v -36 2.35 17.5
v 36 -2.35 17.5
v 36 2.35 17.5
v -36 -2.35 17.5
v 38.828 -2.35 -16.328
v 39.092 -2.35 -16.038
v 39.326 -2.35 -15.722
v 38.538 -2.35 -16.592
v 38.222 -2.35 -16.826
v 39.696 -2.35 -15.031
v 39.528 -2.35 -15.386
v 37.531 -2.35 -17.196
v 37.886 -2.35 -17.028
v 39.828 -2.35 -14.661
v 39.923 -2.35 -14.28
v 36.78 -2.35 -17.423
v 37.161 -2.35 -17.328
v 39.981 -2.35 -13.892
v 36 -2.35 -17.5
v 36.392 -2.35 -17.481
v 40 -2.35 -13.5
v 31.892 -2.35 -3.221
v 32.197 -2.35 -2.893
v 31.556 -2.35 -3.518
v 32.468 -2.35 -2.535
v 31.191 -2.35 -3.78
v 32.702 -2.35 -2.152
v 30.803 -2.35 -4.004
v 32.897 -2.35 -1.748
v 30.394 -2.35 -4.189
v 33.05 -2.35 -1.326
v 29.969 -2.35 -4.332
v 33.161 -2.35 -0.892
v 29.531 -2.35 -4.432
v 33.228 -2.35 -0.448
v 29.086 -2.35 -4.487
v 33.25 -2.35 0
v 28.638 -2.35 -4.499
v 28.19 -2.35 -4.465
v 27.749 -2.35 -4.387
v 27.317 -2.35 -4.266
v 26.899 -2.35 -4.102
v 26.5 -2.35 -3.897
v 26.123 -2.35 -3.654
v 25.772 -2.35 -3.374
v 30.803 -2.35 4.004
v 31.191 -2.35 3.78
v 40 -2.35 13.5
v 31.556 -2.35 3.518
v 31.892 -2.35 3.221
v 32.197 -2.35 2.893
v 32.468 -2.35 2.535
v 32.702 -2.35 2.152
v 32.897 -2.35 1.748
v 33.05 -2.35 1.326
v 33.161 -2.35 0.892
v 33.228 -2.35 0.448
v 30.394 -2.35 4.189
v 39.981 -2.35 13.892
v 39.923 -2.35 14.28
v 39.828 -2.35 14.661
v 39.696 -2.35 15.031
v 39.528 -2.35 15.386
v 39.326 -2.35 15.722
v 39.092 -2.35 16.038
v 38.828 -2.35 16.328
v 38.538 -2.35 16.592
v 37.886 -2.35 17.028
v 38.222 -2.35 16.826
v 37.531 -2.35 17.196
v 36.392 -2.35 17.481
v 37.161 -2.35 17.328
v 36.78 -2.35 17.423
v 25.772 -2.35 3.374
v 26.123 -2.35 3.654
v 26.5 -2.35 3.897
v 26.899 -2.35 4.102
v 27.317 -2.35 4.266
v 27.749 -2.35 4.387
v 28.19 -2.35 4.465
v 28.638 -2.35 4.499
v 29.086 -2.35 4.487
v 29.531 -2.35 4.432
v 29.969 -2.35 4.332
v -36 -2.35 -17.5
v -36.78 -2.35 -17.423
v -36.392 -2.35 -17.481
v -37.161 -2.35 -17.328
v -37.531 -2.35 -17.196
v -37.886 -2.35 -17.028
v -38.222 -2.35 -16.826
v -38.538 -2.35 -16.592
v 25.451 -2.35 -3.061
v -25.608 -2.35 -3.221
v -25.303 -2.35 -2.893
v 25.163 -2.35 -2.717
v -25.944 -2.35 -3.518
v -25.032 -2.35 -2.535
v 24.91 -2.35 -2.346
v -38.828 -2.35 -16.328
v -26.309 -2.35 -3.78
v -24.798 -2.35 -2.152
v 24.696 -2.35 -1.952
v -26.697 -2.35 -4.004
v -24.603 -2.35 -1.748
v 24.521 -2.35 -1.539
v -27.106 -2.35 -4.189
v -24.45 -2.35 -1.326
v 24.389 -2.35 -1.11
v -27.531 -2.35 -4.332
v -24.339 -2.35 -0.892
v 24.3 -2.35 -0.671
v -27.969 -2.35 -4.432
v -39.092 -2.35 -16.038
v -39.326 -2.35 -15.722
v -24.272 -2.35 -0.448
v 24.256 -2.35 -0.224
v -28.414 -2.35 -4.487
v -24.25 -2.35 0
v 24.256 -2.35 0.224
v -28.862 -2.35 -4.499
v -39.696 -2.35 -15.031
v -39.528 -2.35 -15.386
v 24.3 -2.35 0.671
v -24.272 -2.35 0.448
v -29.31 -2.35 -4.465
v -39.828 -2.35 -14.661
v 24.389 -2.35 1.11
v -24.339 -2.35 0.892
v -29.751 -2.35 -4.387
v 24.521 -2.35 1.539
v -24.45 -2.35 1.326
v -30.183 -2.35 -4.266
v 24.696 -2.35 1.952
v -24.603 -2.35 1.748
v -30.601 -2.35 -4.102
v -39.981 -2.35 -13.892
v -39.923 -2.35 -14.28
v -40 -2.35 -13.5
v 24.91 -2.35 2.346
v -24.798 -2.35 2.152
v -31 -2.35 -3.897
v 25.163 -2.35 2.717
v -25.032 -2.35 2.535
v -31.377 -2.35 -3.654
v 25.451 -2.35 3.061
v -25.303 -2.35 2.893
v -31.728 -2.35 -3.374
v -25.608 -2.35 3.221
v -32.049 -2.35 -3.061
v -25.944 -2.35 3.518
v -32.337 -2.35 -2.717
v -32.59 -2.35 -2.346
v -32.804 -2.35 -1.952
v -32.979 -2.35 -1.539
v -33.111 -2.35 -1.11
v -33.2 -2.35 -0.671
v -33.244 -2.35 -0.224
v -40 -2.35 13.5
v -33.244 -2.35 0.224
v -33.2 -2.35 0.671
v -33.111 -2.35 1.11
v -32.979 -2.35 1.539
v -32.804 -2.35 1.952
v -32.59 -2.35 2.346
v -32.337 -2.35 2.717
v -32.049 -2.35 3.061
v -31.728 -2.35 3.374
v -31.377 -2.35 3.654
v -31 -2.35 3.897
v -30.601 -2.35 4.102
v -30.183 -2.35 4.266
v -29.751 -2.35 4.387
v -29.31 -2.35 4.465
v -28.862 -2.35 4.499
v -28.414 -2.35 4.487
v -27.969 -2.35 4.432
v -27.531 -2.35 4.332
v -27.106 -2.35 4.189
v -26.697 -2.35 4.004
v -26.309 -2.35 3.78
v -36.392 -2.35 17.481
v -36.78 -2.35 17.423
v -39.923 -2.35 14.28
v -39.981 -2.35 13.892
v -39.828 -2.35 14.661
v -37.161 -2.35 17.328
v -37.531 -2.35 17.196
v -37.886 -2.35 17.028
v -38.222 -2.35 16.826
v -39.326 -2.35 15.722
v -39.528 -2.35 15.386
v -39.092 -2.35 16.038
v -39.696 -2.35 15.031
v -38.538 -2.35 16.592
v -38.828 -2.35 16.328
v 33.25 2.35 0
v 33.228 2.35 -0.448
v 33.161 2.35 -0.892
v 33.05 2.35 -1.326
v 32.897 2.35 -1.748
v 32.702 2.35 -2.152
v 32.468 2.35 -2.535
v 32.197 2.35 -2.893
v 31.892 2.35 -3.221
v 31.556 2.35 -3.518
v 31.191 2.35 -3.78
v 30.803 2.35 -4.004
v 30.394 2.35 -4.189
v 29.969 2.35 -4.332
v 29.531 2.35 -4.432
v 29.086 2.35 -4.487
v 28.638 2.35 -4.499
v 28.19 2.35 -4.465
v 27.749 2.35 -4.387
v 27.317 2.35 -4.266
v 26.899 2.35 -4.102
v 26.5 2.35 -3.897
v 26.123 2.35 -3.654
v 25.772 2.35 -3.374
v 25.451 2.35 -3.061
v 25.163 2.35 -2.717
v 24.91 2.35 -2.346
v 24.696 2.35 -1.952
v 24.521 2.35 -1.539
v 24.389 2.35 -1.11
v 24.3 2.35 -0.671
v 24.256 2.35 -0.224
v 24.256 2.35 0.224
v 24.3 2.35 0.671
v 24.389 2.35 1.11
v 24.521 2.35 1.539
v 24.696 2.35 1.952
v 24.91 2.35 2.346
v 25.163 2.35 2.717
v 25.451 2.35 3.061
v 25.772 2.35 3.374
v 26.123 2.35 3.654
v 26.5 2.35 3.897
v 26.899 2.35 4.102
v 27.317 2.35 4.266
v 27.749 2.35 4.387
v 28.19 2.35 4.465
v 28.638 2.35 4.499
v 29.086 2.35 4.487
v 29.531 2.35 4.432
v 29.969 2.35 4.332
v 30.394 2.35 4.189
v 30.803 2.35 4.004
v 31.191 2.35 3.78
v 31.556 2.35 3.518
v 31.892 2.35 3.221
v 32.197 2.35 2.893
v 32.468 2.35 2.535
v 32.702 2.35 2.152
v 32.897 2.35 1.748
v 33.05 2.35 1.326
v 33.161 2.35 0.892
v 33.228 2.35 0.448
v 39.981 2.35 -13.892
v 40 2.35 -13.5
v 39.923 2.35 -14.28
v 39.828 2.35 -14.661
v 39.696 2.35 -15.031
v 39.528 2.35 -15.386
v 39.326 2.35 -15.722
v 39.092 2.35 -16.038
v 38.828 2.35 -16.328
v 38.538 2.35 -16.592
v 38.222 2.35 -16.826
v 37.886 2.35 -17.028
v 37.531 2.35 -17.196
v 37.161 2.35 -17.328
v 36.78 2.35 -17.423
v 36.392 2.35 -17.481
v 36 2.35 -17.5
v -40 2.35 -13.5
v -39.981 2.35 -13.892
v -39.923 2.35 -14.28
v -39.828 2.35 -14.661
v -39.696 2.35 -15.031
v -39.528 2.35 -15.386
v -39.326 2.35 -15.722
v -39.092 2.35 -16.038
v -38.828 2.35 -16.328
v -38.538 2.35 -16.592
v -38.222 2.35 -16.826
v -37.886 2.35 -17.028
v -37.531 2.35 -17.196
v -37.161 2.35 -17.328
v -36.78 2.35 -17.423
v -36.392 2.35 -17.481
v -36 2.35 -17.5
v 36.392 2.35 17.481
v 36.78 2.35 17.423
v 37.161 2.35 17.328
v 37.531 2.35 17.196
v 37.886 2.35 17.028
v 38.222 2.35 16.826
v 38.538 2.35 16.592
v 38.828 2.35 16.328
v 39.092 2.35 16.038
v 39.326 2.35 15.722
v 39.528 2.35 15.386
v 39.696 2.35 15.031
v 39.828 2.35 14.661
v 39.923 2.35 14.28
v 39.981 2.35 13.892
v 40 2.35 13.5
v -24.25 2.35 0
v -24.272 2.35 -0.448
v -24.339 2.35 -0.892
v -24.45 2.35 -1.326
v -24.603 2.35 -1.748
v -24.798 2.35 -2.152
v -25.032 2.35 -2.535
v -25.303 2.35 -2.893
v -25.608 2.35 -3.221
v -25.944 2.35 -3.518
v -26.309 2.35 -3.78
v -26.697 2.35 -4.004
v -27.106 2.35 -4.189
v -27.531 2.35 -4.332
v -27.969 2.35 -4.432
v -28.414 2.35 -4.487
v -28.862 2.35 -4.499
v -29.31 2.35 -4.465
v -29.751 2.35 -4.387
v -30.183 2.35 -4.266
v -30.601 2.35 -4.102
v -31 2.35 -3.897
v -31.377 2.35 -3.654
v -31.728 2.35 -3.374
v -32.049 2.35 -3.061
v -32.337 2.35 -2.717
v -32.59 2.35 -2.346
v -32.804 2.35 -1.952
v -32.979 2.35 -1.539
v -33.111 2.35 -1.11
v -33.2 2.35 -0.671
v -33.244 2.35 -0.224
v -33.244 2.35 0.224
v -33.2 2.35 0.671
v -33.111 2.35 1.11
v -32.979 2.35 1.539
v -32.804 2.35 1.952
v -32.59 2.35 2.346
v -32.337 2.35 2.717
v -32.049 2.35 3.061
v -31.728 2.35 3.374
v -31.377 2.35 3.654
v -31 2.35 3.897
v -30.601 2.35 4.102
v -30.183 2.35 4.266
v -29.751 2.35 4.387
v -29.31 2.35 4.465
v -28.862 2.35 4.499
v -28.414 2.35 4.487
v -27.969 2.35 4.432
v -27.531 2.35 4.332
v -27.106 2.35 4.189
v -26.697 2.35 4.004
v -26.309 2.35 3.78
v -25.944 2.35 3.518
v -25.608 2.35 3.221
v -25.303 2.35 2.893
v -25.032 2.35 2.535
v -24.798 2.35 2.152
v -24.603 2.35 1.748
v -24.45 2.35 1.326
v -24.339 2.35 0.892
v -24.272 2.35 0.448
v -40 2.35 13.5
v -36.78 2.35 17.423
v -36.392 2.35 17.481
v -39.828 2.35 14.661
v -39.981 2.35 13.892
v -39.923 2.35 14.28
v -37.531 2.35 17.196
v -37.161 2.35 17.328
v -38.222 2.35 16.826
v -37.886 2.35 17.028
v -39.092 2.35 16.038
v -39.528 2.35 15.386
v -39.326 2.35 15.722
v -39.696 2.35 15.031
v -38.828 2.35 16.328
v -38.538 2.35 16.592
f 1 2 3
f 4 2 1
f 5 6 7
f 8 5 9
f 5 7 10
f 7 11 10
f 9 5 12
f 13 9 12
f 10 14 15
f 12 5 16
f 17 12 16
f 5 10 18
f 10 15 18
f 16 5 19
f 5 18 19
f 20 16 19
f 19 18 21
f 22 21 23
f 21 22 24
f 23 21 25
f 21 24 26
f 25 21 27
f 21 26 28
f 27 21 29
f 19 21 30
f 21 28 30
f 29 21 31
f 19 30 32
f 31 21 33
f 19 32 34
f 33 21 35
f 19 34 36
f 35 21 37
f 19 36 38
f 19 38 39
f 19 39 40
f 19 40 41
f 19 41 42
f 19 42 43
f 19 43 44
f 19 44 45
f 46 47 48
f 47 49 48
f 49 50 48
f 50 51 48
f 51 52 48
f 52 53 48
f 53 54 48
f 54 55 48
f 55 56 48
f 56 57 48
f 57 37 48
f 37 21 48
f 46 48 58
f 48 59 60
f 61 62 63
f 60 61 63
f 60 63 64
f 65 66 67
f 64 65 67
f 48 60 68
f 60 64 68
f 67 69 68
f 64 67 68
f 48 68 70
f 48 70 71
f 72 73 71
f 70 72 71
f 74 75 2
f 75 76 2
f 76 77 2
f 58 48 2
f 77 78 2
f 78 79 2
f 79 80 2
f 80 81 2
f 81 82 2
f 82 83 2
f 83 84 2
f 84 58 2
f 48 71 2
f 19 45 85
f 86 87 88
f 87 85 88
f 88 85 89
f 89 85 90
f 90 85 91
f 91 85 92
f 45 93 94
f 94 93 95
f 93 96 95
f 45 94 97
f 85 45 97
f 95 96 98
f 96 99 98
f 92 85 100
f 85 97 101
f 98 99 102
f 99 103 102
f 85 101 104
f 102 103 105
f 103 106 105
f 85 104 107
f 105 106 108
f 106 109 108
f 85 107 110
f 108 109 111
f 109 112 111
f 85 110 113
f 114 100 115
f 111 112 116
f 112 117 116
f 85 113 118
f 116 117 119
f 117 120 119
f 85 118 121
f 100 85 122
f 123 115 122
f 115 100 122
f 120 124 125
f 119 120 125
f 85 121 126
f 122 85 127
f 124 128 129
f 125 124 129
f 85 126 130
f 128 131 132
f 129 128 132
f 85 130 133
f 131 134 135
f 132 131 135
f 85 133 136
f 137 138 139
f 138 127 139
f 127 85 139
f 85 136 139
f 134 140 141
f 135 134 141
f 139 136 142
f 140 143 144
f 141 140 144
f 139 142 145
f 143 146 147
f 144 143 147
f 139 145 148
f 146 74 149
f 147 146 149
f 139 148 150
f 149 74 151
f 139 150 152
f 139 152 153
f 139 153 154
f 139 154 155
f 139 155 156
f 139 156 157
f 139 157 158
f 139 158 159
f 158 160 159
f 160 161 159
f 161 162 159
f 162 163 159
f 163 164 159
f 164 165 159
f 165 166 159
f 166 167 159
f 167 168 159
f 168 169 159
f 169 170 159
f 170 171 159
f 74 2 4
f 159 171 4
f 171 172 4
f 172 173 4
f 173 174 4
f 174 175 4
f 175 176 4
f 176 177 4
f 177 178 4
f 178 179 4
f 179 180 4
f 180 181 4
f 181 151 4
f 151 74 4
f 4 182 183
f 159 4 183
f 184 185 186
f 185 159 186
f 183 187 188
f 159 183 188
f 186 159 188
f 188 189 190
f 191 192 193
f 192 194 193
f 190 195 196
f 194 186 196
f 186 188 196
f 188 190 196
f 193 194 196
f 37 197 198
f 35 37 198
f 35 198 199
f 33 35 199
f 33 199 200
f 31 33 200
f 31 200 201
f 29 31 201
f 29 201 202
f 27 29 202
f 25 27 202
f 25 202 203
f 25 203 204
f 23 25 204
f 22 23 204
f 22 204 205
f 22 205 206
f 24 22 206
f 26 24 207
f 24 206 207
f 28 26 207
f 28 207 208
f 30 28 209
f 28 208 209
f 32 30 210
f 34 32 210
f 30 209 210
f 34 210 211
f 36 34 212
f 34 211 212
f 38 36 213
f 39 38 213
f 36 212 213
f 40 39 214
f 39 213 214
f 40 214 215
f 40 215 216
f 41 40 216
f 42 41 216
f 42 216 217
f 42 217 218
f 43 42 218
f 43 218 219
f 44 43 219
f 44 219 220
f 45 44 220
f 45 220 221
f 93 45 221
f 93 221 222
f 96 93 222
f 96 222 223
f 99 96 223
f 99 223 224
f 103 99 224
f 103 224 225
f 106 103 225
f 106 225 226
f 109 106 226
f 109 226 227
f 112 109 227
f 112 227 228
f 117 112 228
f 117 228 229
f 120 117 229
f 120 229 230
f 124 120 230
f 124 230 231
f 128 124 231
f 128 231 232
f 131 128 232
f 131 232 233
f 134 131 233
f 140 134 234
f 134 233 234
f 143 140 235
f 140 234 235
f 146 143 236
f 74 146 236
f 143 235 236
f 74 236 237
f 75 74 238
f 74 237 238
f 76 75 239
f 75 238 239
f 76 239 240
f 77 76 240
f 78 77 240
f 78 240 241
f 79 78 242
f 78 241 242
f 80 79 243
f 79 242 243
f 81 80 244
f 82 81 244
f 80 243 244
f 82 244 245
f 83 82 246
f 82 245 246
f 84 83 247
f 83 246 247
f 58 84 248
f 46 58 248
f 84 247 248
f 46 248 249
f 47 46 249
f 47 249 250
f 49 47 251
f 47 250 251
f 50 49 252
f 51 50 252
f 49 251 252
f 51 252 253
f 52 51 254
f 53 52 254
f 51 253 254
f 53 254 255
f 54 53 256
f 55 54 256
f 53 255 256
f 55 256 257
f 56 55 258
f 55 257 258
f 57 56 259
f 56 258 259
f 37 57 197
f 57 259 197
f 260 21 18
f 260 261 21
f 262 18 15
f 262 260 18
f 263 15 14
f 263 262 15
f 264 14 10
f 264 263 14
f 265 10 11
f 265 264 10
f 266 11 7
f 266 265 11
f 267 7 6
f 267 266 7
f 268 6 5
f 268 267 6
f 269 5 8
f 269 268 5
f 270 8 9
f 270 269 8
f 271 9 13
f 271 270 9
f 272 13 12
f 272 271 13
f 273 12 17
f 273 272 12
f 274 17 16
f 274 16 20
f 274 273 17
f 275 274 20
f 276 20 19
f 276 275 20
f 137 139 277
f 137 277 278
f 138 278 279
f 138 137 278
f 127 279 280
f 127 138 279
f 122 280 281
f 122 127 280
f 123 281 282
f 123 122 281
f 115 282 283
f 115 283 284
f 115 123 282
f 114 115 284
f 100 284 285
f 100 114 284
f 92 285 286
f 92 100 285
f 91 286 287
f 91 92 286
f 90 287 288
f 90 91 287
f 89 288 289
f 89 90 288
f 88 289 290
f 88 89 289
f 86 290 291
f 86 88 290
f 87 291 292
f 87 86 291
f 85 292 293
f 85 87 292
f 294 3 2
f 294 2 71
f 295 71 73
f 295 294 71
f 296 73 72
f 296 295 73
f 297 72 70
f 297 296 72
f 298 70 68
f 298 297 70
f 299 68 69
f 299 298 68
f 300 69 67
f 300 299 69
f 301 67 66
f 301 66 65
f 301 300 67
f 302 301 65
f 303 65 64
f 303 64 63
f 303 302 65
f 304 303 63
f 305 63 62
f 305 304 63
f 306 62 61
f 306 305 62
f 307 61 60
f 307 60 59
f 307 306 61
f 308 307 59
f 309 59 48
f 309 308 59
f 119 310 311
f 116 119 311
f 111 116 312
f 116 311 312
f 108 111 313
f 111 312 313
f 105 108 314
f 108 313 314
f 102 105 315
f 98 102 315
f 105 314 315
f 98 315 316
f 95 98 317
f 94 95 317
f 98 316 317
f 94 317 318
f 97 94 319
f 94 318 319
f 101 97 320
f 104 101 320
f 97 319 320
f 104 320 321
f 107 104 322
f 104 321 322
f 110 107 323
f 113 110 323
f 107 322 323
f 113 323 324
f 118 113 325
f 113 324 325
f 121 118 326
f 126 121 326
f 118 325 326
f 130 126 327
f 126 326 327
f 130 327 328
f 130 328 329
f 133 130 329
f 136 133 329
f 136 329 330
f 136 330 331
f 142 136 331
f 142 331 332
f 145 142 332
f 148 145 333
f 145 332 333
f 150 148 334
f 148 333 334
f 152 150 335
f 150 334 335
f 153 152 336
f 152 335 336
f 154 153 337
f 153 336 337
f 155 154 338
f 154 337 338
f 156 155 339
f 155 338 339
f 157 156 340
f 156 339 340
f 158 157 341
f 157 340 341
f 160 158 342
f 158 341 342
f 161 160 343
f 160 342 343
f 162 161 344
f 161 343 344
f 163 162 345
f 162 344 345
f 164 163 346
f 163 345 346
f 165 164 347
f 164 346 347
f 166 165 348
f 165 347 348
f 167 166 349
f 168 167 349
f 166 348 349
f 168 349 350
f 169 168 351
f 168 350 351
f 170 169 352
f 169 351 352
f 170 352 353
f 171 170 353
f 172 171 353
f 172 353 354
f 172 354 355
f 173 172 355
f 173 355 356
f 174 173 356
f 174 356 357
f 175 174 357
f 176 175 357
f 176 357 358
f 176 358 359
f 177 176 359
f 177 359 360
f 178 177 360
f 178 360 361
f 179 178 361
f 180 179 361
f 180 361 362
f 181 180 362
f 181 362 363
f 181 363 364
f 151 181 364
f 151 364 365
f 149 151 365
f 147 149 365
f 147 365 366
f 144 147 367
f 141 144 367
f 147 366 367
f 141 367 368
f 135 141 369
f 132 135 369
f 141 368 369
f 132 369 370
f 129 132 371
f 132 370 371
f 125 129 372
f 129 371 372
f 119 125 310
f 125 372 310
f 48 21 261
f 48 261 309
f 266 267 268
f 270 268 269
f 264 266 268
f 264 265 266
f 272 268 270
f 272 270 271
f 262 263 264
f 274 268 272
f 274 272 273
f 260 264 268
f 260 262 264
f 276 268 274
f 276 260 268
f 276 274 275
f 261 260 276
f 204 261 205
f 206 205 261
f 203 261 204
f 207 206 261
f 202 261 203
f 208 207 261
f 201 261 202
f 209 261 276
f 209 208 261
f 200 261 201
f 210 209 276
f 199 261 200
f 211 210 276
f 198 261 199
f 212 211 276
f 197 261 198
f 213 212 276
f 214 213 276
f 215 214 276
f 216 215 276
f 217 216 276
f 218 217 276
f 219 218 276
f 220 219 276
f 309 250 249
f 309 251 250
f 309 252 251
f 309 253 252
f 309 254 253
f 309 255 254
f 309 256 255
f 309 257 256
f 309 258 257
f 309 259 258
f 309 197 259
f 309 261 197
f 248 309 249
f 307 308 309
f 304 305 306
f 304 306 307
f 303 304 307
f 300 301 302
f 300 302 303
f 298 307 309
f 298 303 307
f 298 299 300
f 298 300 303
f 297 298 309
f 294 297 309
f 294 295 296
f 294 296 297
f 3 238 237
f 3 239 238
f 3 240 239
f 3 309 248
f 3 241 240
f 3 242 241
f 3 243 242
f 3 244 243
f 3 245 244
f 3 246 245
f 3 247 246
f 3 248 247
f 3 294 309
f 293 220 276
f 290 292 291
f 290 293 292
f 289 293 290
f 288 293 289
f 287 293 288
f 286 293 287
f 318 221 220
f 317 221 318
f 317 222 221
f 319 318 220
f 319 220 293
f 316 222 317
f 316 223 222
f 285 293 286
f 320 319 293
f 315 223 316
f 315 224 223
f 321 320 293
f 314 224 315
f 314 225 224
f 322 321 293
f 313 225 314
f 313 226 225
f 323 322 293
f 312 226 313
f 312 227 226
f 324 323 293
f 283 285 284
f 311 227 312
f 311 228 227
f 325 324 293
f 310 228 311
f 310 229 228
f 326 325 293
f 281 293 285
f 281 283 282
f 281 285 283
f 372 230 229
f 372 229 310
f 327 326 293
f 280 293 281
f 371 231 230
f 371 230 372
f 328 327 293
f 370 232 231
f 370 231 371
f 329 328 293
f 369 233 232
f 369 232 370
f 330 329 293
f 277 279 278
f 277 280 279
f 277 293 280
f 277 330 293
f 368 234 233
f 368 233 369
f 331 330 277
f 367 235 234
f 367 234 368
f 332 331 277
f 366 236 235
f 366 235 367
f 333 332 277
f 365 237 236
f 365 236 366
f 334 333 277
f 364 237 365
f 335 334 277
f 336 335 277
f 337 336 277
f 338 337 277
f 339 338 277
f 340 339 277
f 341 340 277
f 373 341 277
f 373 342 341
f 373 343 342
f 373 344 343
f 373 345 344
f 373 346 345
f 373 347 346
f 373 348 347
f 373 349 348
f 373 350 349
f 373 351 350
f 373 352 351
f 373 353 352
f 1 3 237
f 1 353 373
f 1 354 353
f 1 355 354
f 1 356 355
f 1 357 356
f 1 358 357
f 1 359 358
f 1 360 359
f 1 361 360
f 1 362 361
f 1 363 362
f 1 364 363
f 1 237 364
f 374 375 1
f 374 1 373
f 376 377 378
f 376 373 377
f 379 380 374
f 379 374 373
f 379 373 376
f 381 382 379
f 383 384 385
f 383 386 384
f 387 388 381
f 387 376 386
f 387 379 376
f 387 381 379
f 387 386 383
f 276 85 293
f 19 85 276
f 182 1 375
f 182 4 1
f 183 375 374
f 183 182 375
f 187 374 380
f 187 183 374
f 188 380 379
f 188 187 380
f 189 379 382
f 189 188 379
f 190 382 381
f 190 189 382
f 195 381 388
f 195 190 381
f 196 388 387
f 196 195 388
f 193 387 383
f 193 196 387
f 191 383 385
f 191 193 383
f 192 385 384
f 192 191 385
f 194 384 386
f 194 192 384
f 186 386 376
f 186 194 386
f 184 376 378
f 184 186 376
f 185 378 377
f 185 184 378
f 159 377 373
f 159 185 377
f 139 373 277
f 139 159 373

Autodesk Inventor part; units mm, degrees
ref_plane "YZ Plane" through (0, 0, 0) normal (1, 0, 0) x (0, 1, 0)
ref_plane "XZ Plane" through (0, 0, 0) normal (0, 1, 0) x (-1, 0, 0)
ref_plane "XY Plane" through (0, 0, 0) normal (0, 0, 1) x (1, 0, 0)
sketch "Sketch1" plane through (0, 0, 0) normal (0, 1, 0) x (-1, 0, 0)
  line L0 (-40, 17.5) -> (40, 17.5)
  line L1 (40, 17.5) -> (40, -17.5)
  line L2 (40, -17.5) -> (-40, -17.5)
  line L3 (-40, -17.5) -> (-40, 17.5)
  line L4 (-40, 17.5) -> (40, -17.5) construction
  line L5 (40, 17.5) -> (-40, -17.5) construction
  point P0 (0, 0)
  point P1 (0, 0)
  dimension "d10" = 80
  dimension "d11" = 35
extrude "Extrusion3" add sketch "Sketch1" along normal mid plane 4.7
sketch "Sketch3" plane through (0, 2.35, 0) normal (0, 1, 0) x (1, 0, 0)
  line L0 (-40, 17.5) -> (-40, -17.5) projected
  circle A0 centre (-28.75, 0) radius 4.5
  circle A1 centre (0, 0) radius 17.5
  line L1 (40, -17.5) -> (40, 17.5) projected
  circle A2 centre (28.75, 0) radius 4.5
  line L2 (17.5, 0) -> (17.5, -17.5)
  line L3 (-40, -17.5) -> (40, -17.5) projected
  dimension "d18" = 35
  dimension "d15" = 9
  dimension "d17" = 9
  dimension "d19" = 22.5
  dimension "d20" = 11.25
  dimension "d21" = 11.25
extrude "Extrusion4" cut sketch "Sketch3" against normal through all contours A0 | A2
fillet "Fillet1" radius 4 4 edges at (-40, 0, 17.5) (40, 0, 17.5) (40, 0, -17.5) (-40, 0, -17.5)
equation "\"d15\" = d17"
equation "\"d20\" = 0.5 * d19"
equation "\"d21\" = d20"
properties part number "SP11V1 Planchuela Baranda" material "Acero, carbono"
